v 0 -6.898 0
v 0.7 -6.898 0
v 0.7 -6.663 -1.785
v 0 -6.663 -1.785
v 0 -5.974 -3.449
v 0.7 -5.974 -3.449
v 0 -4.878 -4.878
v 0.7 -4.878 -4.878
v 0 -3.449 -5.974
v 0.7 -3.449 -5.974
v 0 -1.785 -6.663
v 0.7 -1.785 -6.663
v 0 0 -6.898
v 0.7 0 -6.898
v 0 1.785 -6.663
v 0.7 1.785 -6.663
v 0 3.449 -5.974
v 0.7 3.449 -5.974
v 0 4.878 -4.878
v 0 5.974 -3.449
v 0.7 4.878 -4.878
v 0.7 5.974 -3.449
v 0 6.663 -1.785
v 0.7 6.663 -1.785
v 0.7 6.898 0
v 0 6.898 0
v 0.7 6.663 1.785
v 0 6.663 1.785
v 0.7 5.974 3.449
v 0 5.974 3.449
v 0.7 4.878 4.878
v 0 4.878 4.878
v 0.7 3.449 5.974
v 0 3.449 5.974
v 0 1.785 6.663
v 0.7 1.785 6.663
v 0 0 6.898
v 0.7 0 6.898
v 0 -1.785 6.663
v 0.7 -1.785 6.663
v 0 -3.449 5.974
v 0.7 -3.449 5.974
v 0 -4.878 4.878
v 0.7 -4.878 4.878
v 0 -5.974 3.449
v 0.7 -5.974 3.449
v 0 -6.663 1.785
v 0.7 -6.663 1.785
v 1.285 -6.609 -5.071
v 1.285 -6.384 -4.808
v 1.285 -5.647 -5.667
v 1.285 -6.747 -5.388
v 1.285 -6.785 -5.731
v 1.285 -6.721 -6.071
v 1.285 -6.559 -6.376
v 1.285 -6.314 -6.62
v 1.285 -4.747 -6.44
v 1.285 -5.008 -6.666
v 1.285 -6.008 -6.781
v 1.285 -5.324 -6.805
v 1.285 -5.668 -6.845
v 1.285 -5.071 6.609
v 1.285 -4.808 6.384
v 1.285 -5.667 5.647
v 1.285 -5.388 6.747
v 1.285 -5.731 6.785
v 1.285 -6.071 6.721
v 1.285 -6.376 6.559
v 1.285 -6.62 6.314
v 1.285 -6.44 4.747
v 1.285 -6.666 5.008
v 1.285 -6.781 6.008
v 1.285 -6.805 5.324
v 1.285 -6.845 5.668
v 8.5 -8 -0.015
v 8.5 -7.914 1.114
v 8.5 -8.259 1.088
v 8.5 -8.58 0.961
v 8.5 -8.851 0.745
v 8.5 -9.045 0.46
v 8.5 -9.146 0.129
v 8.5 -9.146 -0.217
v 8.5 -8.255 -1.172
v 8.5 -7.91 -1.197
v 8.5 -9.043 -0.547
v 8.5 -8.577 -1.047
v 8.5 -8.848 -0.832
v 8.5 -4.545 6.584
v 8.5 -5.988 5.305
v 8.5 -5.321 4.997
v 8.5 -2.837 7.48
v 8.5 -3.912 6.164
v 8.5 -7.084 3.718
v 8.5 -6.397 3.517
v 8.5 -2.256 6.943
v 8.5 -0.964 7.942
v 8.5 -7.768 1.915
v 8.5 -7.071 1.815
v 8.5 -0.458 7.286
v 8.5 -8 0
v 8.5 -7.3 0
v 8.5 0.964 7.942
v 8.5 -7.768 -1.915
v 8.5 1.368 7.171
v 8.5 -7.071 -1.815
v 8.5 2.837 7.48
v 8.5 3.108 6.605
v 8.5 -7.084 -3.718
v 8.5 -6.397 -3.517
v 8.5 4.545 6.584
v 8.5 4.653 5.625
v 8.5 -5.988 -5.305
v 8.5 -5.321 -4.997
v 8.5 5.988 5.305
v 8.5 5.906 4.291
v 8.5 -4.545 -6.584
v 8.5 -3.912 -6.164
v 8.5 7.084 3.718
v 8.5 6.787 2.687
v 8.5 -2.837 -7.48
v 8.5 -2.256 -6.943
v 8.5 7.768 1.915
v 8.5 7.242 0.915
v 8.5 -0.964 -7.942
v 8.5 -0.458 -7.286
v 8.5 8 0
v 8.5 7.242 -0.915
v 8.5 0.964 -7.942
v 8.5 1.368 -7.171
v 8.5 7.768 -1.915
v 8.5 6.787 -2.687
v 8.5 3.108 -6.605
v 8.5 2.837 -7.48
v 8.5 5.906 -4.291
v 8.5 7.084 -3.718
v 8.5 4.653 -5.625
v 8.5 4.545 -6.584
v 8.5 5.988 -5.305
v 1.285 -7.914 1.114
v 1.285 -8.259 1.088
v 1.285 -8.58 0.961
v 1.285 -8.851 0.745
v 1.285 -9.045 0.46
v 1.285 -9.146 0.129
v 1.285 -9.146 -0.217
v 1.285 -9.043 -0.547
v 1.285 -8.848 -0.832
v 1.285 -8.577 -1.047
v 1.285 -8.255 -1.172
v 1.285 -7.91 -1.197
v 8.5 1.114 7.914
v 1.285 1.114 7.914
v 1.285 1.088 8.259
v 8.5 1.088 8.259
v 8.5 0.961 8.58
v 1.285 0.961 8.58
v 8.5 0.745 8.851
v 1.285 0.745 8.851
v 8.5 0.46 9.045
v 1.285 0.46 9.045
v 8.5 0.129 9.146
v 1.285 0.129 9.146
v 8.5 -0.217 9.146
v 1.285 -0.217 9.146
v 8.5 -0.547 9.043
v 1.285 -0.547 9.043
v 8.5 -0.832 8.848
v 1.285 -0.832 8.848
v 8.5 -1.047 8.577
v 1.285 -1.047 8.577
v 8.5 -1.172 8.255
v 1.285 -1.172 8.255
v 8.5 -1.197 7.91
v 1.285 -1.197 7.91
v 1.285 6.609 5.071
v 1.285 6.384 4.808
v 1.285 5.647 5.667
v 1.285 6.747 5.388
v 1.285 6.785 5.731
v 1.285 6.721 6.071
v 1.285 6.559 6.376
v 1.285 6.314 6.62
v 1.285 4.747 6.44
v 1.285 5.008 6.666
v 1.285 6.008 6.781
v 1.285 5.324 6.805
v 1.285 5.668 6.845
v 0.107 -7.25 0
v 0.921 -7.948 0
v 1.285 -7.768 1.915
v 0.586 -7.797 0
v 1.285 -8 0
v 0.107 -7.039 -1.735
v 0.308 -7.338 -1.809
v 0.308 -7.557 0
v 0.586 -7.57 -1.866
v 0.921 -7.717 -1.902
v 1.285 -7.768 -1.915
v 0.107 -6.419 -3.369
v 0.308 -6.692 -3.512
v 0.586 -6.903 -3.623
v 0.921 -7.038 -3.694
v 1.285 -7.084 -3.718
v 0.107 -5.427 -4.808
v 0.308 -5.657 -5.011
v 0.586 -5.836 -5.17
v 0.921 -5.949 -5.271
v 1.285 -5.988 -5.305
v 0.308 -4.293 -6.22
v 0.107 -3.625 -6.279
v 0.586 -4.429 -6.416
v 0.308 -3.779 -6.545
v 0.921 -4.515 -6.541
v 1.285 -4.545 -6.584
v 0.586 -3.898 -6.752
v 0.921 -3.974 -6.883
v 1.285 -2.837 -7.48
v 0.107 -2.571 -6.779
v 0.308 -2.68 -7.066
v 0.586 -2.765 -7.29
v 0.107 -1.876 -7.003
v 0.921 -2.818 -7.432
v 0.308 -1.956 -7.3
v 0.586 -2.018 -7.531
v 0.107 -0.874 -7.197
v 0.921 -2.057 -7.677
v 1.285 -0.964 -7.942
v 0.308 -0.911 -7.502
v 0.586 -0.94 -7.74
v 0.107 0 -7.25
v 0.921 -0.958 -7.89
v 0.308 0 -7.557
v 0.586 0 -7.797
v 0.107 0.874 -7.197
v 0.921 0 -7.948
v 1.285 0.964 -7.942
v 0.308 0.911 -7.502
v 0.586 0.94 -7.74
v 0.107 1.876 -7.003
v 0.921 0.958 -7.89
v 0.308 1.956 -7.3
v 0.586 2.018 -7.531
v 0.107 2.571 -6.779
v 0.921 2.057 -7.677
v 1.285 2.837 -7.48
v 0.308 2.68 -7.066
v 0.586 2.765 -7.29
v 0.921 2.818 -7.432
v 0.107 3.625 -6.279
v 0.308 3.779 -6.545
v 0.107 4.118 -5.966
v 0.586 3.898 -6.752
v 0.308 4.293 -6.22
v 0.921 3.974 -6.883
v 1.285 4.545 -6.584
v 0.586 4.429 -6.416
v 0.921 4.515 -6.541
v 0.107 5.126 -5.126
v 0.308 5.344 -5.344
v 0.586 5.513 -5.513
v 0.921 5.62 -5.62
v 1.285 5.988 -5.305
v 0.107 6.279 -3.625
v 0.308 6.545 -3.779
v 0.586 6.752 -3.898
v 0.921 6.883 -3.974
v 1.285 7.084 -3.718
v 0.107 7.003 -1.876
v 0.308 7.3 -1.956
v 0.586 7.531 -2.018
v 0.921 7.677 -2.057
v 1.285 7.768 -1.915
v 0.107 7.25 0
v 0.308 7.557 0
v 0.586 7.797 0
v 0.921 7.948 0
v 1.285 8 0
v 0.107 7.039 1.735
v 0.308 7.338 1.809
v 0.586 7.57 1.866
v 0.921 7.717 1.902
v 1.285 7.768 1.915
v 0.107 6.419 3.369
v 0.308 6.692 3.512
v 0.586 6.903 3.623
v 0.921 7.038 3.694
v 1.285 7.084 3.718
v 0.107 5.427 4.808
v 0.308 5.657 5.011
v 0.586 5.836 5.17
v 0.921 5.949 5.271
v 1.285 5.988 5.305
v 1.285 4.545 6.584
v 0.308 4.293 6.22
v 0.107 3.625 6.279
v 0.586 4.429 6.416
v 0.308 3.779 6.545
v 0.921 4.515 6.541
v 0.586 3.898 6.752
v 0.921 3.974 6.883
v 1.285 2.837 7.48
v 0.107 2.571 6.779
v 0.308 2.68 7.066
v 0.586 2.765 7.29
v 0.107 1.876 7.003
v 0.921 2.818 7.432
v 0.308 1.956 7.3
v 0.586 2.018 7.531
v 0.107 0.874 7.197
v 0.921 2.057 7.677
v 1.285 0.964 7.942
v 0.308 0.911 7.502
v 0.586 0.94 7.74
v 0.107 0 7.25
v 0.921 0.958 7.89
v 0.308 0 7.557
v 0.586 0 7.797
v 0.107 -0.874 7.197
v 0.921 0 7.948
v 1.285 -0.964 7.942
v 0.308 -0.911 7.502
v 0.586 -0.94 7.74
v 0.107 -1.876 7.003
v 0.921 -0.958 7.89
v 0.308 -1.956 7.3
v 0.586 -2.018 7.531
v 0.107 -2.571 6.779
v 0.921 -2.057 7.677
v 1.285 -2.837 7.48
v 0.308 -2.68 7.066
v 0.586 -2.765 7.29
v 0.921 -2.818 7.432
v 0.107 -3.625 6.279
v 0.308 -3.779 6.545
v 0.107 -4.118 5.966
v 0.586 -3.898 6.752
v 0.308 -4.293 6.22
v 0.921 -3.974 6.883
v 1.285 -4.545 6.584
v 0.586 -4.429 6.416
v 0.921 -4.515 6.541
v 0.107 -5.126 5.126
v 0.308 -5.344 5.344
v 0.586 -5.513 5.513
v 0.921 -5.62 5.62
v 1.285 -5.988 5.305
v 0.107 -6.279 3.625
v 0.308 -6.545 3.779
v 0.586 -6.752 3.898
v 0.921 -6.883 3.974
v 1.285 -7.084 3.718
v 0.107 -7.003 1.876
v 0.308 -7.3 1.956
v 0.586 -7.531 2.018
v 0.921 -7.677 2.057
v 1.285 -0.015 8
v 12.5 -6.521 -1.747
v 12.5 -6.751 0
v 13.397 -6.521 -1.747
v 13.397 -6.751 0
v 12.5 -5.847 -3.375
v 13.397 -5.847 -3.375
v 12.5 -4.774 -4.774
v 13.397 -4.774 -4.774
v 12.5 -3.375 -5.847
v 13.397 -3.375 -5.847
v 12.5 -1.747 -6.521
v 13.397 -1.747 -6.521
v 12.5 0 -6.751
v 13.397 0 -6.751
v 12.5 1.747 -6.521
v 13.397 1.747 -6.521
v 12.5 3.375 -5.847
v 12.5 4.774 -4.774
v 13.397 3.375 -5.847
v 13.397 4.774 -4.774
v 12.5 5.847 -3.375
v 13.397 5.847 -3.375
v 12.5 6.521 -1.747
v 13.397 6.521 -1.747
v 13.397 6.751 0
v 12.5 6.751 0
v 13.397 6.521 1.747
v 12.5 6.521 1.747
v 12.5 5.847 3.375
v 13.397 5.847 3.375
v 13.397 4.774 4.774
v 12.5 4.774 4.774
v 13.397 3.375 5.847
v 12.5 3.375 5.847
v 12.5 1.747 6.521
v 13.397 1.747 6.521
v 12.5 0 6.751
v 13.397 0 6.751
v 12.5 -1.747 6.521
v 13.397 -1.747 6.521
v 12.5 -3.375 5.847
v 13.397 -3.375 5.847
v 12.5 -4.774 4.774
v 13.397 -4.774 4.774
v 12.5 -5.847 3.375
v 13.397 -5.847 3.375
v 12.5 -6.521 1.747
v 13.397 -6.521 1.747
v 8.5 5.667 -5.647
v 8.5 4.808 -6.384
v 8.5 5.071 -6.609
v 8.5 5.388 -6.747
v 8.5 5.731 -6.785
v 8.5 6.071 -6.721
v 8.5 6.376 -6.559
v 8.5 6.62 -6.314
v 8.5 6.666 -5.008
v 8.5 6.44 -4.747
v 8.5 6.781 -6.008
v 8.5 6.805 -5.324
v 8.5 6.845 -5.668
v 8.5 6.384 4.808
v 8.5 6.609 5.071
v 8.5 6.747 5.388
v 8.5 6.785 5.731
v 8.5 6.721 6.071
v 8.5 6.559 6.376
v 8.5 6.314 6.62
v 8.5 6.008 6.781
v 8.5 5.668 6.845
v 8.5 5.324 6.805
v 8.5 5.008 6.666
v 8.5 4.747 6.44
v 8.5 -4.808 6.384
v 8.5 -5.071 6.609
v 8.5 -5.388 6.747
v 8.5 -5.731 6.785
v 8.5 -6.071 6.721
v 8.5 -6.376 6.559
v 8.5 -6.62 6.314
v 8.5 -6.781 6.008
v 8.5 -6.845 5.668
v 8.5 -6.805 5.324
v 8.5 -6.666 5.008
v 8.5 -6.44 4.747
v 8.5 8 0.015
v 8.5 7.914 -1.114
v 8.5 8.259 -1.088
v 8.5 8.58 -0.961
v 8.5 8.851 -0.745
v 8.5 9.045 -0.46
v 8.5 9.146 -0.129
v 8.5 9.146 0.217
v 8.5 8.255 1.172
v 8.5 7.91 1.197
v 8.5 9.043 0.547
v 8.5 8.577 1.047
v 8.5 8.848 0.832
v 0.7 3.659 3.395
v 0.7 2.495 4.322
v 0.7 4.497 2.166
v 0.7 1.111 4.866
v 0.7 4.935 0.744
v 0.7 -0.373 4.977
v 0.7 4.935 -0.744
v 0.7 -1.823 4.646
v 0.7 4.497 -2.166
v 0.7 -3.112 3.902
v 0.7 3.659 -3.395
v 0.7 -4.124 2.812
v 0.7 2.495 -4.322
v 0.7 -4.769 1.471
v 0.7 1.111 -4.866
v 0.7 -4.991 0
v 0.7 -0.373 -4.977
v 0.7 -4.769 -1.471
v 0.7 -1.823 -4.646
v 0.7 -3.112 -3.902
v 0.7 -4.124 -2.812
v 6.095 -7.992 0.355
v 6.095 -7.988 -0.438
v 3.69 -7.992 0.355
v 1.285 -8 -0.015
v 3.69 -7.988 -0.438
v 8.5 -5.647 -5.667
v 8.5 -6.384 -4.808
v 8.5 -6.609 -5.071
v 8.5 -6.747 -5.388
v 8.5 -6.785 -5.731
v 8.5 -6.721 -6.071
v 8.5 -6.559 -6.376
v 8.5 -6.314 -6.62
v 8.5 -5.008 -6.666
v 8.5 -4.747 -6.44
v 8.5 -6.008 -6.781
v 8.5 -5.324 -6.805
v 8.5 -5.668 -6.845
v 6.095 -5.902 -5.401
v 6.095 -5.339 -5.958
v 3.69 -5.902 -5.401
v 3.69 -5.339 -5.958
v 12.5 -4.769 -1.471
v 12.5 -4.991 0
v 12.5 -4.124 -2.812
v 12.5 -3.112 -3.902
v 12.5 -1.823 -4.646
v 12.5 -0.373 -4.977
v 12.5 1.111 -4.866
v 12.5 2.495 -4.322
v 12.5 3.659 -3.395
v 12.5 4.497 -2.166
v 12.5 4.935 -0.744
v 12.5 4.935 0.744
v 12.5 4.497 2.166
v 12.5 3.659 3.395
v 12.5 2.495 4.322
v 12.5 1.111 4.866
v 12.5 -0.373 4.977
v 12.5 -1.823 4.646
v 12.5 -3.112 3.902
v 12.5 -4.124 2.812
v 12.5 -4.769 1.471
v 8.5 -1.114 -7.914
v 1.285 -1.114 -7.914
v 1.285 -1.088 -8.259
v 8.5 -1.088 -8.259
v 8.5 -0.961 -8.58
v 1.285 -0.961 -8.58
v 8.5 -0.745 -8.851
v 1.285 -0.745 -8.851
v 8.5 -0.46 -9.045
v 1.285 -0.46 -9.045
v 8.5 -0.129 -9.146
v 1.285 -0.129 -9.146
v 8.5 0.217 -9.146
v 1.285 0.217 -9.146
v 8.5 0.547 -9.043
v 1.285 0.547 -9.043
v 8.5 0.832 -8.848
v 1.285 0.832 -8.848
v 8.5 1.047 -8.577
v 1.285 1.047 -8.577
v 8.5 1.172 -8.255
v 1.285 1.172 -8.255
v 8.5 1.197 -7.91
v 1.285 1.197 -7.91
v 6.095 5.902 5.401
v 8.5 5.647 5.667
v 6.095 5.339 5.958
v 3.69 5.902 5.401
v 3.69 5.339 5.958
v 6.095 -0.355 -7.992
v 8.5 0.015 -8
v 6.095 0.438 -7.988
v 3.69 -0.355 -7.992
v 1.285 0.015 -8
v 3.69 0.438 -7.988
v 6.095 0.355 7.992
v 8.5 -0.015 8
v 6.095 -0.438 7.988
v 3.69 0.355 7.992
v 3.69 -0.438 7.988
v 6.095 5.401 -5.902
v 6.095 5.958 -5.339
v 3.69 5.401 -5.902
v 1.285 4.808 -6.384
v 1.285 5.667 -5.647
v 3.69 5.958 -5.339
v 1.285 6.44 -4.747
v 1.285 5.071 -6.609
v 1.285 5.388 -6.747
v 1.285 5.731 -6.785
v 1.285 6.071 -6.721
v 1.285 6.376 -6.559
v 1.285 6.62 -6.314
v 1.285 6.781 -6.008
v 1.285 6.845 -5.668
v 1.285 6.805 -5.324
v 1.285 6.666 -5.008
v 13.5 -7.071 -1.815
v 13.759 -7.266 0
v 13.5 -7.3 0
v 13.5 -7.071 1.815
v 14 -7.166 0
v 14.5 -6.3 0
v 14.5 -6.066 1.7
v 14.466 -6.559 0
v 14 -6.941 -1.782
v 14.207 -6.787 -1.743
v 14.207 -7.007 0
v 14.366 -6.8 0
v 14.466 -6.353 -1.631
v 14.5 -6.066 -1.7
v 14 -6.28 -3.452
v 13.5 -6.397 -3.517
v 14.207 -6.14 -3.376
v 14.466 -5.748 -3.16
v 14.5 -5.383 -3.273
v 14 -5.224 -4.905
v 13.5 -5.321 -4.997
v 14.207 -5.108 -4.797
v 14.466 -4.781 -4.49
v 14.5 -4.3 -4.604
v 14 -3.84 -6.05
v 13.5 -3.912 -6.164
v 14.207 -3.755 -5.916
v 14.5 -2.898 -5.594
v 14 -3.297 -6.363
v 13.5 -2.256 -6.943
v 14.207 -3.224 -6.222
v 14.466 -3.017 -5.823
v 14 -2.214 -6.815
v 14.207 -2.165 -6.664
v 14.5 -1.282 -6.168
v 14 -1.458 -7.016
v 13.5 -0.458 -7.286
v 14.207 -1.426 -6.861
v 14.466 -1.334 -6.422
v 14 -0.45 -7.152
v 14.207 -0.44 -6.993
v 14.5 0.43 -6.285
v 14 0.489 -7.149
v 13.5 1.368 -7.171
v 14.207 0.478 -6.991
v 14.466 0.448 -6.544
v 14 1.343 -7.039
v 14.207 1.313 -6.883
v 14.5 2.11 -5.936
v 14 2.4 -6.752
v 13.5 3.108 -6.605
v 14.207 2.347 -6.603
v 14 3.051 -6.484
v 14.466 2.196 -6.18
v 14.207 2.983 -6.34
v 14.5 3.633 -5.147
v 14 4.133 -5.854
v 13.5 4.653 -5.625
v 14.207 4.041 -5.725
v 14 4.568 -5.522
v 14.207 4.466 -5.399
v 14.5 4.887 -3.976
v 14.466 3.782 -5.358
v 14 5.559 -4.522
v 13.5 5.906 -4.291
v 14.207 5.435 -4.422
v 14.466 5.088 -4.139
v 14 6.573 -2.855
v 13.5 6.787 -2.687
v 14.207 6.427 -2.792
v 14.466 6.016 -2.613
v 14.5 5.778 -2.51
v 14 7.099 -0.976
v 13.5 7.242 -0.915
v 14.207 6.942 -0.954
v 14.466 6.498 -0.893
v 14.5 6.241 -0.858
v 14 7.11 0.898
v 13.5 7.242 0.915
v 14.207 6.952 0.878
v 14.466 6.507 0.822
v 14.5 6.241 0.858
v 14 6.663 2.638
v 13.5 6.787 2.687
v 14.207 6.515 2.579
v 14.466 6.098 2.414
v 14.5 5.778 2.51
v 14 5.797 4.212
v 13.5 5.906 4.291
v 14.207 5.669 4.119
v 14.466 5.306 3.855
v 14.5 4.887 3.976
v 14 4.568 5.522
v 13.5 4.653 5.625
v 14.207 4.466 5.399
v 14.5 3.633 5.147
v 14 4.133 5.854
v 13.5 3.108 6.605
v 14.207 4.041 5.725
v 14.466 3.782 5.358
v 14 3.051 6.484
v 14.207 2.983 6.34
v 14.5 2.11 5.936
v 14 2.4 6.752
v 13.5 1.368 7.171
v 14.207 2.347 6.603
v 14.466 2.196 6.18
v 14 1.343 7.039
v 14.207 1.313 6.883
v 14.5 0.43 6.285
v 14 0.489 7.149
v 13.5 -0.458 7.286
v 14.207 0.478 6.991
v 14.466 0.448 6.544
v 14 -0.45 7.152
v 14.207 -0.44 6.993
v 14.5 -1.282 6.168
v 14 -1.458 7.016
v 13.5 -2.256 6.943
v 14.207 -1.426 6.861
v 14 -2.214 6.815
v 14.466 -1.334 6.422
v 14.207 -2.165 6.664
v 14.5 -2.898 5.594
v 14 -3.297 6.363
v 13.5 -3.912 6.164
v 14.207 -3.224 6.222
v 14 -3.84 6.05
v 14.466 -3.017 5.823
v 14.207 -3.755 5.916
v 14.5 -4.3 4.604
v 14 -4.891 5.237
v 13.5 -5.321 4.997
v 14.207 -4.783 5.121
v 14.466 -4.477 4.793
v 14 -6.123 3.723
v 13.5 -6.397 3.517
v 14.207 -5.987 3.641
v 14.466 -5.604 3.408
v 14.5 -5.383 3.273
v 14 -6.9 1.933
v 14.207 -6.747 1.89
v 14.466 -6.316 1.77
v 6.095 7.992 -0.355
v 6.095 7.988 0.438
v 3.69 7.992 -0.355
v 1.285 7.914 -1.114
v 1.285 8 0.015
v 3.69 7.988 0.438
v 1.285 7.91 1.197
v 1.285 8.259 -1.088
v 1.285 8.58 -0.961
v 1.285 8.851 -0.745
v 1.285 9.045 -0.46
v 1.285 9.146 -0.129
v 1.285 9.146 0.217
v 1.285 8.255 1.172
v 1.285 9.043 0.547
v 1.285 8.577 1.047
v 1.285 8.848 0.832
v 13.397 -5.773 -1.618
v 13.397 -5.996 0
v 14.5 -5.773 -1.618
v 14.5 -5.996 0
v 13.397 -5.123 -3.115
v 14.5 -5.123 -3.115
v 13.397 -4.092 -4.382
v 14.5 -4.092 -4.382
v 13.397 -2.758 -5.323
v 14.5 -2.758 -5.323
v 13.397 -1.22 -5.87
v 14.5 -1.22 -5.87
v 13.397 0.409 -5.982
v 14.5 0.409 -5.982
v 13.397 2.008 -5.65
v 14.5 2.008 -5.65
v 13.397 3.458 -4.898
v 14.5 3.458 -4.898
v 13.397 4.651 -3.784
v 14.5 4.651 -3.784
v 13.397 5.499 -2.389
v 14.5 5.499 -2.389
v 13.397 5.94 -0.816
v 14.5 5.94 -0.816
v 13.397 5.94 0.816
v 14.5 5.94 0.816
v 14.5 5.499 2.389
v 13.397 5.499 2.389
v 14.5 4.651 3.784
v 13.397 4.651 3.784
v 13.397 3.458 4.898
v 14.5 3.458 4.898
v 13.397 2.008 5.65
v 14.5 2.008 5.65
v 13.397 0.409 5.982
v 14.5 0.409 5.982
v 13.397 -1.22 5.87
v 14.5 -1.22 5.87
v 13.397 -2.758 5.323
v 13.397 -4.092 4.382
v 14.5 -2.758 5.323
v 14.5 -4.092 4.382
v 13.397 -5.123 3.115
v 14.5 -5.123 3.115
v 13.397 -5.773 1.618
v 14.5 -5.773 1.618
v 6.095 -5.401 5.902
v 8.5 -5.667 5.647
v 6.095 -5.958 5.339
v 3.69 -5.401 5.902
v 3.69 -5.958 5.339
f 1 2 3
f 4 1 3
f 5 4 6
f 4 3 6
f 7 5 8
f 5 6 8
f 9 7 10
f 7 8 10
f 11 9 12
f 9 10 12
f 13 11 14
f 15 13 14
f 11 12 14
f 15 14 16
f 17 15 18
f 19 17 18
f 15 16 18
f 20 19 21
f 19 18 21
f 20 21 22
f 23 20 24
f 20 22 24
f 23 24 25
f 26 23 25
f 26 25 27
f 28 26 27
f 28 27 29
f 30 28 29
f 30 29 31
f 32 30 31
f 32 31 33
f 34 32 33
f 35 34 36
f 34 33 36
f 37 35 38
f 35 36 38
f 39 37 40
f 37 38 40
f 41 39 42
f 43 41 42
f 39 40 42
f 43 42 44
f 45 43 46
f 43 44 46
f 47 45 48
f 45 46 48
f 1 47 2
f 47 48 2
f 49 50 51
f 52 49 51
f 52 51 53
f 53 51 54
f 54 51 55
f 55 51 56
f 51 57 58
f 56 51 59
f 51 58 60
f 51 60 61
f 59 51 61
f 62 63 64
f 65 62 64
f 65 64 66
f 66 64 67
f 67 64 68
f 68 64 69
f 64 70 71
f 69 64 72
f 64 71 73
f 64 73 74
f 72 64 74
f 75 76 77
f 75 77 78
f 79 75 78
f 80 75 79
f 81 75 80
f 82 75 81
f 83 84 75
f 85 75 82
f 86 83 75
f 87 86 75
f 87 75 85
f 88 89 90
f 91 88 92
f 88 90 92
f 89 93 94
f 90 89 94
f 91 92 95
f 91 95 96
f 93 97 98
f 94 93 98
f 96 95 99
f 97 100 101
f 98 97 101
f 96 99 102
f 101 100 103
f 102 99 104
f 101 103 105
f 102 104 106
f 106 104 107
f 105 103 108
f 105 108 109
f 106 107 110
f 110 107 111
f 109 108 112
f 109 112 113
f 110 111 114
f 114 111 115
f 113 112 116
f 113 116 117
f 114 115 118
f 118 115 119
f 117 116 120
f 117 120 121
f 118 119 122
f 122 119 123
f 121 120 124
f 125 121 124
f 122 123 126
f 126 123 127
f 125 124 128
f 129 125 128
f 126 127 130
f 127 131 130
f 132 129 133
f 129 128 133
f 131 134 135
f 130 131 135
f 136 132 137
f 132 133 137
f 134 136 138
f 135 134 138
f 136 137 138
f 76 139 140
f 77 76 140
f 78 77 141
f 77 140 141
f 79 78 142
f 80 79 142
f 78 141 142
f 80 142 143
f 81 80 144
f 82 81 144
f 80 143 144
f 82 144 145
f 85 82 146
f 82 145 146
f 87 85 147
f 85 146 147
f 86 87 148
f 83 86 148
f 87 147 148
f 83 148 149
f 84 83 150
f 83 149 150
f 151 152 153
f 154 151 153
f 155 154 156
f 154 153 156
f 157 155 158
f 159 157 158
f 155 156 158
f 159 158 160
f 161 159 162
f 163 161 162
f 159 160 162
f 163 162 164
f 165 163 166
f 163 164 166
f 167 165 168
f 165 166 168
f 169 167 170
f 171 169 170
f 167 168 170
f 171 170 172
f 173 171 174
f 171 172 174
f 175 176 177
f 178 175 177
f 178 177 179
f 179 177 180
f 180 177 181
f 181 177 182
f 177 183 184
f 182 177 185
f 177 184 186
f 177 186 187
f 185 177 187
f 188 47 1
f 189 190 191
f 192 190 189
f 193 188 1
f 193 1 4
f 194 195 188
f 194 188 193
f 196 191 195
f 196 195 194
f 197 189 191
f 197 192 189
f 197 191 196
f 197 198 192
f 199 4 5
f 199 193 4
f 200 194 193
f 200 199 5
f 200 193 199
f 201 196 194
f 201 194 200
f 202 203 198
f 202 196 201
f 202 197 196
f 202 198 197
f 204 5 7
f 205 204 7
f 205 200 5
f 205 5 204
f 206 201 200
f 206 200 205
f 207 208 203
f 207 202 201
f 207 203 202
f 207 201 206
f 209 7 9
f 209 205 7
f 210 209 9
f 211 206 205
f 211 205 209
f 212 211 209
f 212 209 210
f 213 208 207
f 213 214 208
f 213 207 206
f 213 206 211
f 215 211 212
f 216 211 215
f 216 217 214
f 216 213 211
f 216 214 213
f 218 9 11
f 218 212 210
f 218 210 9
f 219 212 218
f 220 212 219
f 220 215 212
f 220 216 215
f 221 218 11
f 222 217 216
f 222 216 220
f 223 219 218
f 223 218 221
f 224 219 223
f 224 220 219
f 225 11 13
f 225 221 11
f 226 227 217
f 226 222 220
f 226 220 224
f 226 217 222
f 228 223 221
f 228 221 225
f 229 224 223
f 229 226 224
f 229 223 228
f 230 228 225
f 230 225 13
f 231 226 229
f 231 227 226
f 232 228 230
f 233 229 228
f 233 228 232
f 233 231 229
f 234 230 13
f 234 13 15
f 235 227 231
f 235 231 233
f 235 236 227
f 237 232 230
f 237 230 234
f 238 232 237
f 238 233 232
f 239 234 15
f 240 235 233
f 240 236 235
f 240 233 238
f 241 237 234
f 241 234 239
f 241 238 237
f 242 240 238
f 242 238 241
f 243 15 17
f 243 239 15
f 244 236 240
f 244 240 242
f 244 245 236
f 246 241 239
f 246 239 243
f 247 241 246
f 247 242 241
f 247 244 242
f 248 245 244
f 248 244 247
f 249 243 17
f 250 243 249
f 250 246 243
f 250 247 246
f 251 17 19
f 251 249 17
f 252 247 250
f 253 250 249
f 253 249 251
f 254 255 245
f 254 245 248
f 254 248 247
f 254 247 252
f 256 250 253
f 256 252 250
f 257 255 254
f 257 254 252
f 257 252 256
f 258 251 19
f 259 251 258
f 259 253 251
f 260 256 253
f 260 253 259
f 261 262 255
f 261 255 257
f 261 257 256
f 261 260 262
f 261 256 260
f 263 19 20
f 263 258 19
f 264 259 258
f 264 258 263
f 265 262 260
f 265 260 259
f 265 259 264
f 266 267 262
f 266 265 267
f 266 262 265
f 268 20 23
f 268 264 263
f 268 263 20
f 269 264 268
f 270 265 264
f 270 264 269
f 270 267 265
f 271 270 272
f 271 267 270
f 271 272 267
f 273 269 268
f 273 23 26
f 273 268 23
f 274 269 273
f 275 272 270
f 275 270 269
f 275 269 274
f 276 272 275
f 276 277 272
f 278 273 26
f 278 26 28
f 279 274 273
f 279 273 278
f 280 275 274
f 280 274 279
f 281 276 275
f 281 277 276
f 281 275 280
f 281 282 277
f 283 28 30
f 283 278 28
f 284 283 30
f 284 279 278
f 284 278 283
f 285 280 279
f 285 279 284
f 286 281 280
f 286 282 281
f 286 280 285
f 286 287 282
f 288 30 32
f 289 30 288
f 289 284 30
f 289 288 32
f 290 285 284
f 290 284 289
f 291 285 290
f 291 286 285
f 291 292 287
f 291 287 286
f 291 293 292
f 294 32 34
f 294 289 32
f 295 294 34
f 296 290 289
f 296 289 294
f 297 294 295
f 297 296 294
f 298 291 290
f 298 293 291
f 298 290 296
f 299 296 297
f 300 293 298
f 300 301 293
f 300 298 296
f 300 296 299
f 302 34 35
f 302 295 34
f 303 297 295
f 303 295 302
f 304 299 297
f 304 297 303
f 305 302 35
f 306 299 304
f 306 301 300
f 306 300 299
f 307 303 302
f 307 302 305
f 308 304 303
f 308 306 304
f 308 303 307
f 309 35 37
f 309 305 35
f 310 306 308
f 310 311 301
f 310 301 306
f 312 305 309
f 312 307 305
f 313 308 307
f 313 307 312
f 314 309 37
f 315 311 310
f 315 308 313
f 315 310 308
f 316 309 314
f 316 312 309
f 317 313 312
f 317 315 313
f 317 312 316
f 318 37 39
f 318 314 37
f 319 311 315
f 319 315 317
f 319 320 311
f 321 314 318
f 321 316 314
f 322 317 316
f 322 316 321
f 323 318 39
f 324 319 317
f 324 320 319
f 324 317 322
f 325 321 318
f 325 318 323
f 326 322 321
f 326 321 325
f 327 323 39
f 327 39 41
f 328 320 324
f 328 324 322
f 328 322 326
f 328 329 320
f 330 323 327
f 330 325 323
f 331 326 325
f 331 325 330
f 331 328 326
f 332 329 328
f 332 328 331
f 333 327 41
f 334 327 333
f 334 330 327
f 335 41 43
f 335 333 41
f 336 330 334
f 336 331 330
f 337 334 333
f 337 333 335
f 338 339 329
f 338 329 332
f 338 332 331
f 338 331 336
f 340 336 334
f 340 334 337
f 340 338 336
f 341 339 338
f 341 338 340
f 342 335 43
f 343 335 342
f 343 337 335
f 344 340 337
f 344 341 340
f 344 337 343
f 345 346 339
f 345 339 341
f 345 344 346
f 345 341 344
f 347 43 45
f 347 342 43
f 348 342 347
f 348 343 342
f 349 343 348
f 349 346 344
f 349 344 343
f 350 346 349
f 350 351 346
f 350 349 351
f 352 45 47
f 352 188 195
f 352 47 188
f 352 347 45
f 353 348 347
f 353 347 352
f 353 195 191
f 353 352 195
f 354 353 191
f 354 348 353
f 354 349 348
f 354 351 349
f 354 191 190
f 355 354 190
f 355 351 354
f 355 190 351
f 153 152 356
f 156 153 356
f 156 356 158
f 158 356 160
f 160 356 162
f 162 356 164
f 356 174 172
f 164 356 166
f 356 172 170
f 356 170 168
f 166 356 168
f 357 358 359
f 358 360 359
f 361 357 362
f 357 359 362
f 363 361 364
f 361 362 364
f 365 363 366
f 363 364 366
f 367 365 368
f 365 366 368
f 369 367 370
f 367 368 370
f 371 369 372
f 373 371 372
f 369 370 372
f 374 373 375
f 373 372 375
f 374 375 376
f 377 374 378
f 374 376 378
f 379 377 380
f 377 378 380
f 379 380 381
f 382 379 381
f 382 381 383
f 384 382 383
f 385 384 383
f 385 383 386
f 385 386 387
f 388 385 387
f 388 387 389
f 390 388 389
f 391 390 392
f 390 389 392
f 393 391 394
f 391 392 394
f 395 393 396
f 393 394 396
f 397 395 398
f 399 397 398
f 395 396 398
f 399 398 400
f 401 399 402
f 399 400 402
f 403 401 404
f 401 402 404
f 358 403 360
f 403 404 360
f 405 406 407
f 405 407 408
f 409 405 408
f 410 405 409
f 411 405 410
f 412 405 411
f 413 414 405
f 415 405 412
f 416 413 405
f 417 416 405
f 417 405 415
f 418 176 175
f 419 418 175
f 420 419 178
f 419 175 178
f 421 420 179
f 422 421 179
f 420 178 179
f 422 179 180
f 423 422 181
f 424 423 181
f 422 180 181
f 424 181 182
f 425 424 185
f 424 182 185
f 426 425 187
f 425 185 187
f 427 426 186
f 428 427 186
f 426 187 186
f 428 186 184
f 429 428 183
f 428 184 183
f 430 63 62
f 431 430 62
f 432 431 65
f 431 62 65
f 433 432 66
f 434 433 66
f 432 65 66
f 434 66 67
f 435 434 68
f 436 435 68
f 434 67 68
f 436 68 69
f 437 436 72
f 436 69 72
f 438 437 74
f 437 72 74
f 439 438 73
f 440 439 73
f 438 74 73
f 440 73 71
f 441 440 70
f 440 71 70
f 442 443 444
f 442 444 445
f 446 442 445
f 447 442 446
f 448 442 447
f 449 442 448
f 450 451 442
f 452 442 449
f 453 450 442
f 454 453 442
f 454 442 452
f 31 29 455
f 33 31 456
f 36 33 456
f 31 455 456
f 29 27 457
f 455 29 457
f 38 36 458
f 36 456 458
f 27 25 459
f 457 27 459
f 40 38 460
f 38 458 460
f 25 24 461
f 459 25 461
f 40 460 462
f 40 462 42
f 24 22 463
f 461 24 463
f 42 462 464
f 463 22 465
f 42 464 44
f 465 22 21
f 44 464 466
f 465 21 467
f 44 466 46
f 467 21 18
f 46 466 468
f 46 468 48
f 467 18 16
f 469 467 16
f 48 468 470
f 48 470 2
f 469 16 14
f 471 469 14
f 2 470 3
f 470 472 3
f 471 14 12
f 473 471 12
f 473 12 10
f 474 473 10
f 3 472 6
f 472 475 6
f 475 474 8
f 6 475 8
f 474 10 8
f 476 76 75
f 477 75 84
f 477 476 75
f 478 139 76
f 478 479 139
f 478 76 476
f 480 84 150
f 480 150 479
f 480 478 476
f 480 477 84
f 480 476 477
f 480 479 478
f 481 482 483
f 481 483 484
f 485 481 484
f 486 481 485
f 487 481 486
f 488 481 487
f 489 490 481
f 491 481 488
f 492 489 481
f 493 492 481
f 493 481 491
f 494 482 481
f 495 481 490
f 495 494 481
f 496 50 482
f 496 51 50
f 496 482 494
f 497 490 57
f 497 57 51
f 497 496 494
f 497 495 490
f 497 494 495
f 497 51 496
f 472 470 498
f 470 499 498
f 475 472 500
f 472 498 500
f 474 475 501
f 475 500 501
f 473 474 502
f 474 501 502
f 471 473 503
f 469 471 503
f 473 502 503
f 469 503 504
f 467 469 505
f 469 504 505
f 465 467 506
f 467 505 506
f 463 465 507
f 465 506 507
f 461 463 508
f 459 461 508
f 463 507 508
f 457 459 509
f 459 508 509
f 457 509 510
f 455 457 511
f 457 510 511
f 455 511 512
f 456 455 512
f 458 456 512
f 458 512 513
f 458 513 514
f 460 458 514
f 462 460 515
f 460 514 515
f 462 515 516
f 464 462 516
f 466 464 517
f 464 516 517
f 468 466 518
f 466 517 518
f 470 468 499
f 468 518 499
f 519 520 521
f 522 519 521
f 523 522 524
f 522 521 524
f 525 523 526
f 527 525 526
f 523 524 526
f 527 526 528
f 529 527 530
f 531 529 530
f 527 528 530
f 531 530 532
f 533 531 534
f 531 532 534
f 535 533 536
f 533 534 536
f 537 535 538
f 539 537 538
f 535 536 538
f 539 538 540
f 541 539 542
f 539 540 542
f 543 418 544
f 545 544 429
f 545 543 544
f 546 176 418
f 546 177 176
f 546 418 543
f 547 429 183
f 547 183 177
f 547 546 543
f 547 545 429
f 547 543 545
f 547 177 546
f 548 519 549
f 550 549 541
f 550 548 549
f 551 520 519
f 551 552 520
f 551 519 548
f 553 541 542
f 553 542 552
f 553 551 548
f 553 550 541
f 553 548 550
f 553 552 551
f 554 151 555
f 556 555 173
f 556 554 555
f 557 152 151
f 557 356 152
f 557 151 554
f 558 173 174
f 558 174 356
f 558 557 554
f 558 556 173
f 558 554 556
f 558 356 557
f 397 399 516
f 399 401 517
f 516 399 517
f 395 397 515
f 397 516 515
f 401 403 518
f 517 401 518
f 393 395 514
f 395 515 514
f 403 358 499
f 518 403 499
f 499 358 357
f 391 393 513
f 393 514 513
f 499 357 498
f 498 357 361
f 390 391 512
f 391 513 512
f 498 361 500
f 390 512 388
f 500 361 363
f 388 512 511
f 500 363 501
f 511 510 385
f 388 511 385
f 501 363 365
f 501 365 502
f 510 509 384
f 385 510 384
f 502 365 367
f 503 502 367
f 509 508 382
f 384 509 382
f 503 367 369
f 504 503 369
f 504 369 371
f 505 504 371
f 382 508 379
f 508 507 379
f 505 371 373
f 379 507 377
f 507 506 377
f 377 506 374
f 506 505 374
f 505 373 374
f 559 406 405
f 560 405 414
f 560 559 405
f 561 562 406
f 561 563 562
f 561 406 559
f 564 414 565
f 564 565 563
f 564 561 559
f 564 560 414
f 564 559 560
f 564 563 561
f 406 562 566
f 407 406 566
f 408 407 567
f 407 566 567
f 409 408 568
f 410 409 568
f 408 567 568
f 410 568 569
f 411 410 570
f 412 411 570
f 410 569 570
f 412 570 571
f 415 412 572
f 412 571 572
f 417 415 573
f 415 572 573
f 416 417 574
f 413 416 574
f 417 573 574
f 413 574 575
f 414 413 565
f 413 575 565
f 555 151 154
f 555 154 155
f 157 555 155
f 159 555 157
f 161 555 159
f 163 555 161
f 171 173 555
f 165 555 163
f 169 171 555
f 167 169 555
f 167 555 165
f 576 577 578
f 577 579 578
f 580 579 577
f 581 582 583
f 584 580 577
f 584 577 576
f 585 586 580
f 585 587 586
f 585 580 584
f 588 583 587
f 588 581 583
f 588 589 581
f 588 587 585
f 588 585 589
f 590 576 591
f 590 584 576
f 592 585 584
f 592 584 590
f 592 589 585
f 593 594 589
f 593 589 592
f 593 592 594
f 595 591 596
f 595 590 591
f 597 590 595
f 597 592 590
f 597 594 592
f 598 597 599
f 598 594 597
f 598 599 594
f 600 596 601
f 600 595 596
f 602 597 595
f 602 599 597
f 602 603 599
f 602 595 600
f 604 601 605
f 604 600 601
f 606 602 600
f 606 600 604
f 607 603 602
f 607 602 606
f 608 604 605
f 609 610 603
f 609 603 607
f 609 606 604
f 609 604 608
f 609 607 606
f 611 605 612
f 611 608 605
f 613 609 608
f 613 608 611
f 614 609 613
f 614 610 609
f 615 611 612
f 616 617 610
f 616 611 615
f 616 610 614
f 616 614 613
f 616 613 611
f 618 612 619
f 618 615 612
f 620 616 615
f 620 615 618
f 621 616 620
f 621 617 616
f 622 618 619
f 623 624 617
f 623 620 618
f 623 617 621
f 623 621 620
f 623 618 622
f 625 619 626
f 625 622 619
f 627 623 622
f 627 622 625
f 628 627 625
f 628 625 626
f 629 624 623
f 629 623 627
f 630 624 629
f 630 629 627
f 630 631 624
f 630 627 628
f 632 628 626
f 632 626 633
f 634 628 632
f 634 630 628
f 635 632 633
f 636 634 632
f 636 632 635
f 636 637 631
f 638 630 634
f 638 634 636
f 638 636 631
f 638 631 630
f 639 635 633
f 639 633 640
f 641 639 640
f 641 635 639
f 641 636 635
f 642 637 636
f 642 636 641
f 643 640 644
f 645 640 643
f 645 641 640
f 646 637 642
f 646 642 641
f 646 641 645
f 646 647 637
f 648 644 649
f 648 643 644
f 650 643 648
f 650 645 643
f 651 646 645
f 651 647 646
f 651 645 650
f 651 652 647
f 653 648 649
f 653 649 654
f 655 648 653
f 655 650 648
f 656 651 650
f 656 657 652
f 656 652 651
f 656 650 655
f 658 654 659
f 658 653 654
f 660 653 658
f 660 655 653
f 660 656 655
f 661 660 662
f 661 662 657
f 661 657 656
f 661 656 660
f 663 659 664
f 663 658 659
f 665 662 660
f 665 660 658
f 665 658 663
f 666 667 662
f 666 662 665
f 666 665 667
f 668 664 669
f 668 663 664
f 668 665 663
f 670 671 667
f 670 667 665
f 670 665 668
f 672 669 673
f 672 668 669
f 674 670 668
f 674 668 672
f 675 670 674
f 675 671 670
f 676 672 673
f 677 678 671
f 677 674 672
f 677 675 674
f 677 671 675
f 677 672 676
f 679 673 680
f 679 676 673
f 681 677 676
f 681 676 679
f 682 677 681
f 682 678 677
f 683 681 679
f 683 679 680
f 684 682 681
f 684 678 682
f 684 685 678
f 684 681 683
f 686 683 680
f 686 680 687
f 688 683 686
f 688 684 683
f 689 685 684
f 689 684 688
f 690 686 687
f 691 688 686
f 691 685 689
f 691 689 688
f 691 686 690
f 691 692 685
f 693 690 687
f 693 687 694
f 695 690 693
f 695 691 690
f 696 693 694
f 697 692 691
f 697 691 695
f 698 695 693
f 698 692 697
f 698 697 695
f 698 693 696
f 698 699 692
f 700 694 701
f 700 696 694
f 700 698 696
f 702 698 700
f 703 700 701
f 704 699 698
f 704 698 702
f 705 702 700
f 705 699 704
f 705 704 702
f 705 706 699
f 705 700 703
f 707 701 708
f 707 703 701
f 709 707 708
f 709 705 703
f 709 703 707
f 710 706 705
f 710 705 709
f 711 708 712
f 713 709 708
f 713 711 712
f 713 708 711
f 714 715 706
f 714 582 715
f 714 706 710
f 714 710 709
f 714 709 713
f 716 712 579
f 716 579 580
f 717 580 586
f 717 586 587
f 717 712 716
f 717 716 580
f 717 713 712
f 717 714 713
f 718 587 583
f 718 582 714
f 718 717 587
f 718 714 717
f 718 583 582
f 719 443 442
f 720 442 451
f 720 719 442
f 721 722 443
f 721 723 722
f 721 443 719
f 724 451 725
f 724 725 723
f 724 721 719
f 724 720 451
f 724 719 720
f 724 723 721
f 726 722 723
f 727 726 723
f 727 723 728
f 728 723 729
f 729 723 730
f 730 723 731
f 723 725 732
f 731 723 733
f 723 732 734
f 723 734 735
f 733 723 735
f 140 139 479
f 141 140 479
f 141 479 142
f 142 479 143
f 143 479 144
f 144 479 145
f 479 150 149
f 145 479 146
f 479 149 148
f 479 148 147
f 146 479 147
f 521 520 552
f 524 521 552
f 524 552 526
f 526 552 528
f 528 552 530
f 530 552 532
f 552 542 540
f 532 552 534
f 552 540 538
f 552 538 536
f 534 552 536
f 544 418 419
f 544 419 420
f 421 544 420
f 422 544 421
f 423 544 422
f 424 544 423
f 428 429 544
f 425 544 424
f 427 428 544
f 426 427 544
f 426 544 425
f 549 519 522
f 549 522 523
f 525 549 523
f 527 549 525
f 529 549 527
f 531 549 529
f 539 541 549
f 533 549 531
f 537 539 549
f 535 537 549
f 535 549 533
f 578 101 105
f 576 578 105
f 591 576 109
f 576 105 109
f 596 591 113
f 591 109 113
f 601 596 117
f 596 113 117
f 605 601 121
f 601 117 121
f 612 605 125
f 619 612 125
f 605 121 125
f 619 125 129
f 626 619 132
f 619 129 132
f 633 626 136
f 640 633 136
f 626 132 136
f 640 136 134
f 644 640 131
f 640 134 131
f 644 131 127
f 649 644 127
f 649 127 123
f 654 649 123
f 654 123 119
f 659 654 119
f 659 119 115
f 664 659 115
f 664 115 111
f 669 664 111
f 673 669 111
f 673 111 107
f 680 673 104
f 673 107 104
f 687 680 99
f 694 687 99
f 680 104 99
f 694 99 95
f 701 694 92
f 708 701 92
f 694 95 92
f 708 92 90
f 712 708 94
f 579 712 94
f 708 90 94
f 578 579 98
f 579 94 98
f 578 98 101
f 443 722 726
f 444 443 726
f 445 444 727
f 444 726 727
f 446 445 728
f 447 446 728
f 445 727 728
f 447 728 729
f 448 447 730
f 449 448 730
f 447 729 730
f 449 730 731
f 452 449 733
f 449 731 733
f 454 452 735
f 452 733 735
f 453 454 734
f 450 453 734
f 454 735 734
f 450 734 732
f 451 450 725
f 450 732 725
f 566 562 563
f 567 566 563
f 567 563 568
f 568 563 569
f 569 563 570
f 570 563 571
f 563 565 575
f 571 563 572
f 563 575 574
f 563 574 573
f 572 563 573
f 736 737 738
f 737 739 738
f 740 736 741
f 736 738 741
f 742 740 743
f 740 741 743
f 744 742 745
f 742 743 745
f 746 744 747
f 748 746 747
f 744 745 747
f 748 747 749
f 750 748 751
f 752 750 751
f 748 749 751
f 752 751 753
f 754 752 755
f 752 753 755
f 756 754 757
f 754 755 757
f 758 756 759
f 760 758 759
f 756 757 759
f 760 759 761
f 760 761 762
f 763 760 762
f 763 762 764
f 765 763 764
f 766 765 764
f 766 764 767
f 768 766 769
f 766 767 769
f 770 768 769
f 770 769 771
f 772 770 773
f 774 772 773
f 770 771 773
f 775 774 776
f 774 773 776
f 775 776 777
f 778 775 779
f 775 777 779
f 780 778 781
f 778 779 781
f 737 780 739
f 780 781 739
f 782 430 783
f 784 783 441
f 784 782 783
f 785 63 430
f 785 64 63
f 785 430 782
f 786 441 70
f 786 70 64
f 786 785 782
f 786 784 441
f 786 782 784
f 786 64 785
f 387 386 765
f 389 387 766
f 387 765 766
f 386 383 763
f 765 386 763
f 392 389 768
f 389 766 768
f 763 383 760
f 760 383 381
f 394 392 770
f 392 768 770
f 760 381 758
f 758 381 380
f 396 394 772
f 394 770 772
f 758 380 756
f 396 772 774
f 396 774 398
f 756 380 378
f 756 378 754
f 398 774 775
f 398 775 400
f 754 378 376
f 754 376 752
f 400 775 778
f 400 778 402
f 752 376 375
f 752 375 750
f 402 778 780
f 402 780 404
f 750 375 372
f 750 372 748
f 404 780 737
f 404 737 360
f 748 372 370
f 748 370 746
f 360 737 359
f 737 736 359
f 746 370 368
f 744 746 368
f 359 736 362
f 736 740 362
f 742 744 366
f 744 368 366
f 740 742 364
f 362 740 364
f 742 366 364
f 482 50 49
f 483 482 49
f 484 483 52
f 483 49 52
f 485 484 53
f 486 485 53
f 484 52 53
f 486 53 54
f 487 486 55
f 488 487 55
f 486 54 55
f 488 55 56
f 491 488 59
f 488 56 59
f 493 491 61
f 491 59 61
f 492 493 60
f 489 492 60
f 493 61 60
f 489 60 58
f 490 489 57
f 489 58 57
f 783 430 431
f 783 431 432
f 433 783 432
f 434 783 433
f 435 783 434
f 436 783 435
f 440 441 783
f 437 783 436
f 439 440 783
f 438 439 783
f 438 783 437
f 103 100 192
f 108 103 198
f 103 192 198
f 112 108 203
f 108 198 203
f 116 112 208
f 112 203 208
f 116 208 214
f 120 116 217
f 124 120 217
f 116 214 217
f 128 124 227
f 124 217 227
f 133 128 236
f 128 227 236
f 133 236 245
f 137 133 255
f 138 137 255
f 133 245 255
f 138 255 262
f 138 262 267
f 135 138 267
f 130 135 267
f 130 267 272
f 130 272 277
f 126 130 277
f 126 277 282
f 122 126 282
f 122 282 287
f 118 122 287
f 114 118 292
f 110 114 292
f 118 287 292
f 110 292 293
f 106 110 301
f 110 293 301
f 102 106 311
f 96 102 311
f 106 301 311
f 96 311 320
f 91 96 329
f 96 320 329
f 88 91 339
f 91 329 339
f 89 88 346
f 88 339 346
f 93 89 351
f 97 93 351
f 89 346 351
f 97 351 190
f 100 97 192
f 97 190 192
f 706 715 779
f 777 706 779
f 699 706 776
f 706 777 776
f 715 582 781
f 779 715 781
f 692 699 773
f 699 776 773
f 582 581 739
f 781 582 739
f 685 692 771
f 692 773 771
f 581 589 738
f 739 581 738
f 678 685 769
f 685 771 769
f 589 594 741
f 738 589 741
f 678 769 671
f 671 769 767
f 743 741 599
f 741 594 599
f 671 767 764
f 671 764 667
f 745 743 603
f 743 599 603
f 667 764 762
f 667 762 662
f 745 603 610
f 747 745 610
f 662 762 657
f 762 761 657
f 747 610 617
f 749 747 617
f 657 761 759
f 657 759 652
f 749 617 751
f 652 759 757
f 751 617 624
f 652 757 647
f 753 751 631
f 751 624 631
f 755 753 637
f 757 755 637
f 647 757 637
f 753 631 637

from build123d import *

# Parameters (mm, degrees)
FILLET_3_R               = 1.3
FILLET_4_R               = 1
EXTRUDE_5_DEPTH          = 7.215220421
PATTERN_CIRCULAR_2_COUNT = 8


with BuildPart() as part:
    # Эскиз2 → Повернуть1 (revolve)
    with BuildSketch(Plane.XY, mode=Mode.PRIVATE) as revolve_1_sk:
        Polygon((0, 8), (0, 6.898346752), (0.7, 6.898346752), (0.7, 4.990991269), (12.5, 4.990991269), (12.5, 6.750991269), (13.39735467, 6.750991269), (13.39735467, 5.995695632), (14.5, 5.995695632), (14.5, 6.265355114), (14.5, 7.3), (8.5, 7.3), (8.5, 8), align=None)
    revolve(revolve_1_sk.sketch.rotate(Axis((0, 0, 0), (1, 0, 0)), 180), axis=Axis((0, 0, 0), (1, 0, 0)))

    # Скругление3
    # the kernel refuses this fillet: 1.3 mm, written as the material it takes off along each edge
    with BuildSketch(Plane(origin=(0, 0, 0), x_dir=(0, -1, 0), z_dir=(0, 0, 1))) as fillet_3_piece_1:
        with BuildLine():
            CenterArc((6.7, 1.284779579), FILLET_3_R, 278.77614781, 81.22385219)
            Line((8, 1.284779579), (8.026, 1.284779579))
            Line((8.026, 1.284779579), (8.026, 0))
            Line((8.026, 0), (8, -0.026))
            ThreePointArc((8, -0.026), (7.449173376, -0.026), (6.902313687, -0.025695592))
            Line((6.902313687, -0.025695592), (6.898346752, 0))
        make_face()
    revolve(axis=Axis((0, 0, 0), (1, 0, 0)), mode=Mode.SUBTRACT)

    # Скругление4
    fillet_4_edges = [part.edges().sort_by_distance(p)[0] for p in [
        (14.5, 7.3, 0),
    ]]
    fillet(fillet_4_edges, radius=FILLET_4_R)


with BuildPart() as body_2:
    # Эскиз5 → Бобышка-Вытянуть5 (new body)
    with BuildSketch(Plane(origin=(1.284779579, 0, 0), x_dir=(0, 0, -1), z_dir=(1, 0, 0))):
        with BuildLine():
            ThreePointArc((7.914111034, -1.114031771), (9.158845977, 0.043851987), (7.909911549, 1.197204782))
            add(Edge.make_bspline(
                [(7.914111034, -1.114031771), (8.035384164, -0.393042361), (8.022984515, 0.476641176), (7.909911549, 1.197204782)],
                knots=[0, 0, 0, 0, 0.218343564, 0.218343564, 0.218343564, 0.218343564], degree=3))
        make_face()
    extrude(amount=EXTRUDE_5_DEPTH)


with BuildPart() as pattern_circular_2_1:
    # Круговой массив2: pattern copy
    add(body_2.part.rotate(Axis((1.284779579, 0, 0), (-1, 0, 0)), 1 * 360 / PATTERN_CIRCULAR_2_COUNT))


with BuildPart() as pattern_circular_2_2:
    # Круговой массив2: pattern copy
    add(body_2.part.rotate(Axis((1.284779579, 0, 0), (-1, 0, 0)), 2 * 360 / PATTERN_CIRCULAR_2_COUNT))


with BuildPart() as pattern_circular_2_3:
    # Круговой массив2: pattern copy
    add(body_2.part.rotate(Axis((1.284779579, 0, 0), (-1, 0, 0)), 3 * 360 / PATTERN_CIRCULAR_2_COUNT))


with BuildPart() as pattern_circular_2_4:
    # Круговой массив2: pattern copy
    add(body_2.part.rotate(Axis((1.284779579, 0, 0), (-1, 0, 0)), 4 * 360 / PATTERN_CIRCULAR_2_COUNT))


with BuildPart() as pattern_circular_2_5:
    # Круговой массив2: pattern copy
    add(body_2.part.rotate(Axis((1.284779579, 0, 0), (-1, 0, 0)), 5 * 360 / PATTERN_CIRCULAR_2_COUNT))


with BuildPart() as pattern_circular_2_6:
    # Круговой массив2: pattern copy
    add(body_2.part.rotate(Axis((1.284779579, 0, 0), (-1, 0, 0)), 6 * 360 / PATTERN_CIRCULAR_2_COUNT))


with BuildPart() as pattern_circular_2_7:
    # Круговой массив2: pattern copy
    add(body_2.part.rotate(Axis((1.284779579, 0, 0), (-1, 0, 0)), 7 * 360 / PATTERN_CIRCULAR_2_COUNT))


solid = Compound([part.part, body_2.part, pattern_circular_2_1.part, pattern_circular_2_2.part, pattern_circular_2_3.part, pattern_circular_2_4.part, pattern_circular_2_5.part, pattern_circular_2_6.part, pattern_circular_2_7.part])
